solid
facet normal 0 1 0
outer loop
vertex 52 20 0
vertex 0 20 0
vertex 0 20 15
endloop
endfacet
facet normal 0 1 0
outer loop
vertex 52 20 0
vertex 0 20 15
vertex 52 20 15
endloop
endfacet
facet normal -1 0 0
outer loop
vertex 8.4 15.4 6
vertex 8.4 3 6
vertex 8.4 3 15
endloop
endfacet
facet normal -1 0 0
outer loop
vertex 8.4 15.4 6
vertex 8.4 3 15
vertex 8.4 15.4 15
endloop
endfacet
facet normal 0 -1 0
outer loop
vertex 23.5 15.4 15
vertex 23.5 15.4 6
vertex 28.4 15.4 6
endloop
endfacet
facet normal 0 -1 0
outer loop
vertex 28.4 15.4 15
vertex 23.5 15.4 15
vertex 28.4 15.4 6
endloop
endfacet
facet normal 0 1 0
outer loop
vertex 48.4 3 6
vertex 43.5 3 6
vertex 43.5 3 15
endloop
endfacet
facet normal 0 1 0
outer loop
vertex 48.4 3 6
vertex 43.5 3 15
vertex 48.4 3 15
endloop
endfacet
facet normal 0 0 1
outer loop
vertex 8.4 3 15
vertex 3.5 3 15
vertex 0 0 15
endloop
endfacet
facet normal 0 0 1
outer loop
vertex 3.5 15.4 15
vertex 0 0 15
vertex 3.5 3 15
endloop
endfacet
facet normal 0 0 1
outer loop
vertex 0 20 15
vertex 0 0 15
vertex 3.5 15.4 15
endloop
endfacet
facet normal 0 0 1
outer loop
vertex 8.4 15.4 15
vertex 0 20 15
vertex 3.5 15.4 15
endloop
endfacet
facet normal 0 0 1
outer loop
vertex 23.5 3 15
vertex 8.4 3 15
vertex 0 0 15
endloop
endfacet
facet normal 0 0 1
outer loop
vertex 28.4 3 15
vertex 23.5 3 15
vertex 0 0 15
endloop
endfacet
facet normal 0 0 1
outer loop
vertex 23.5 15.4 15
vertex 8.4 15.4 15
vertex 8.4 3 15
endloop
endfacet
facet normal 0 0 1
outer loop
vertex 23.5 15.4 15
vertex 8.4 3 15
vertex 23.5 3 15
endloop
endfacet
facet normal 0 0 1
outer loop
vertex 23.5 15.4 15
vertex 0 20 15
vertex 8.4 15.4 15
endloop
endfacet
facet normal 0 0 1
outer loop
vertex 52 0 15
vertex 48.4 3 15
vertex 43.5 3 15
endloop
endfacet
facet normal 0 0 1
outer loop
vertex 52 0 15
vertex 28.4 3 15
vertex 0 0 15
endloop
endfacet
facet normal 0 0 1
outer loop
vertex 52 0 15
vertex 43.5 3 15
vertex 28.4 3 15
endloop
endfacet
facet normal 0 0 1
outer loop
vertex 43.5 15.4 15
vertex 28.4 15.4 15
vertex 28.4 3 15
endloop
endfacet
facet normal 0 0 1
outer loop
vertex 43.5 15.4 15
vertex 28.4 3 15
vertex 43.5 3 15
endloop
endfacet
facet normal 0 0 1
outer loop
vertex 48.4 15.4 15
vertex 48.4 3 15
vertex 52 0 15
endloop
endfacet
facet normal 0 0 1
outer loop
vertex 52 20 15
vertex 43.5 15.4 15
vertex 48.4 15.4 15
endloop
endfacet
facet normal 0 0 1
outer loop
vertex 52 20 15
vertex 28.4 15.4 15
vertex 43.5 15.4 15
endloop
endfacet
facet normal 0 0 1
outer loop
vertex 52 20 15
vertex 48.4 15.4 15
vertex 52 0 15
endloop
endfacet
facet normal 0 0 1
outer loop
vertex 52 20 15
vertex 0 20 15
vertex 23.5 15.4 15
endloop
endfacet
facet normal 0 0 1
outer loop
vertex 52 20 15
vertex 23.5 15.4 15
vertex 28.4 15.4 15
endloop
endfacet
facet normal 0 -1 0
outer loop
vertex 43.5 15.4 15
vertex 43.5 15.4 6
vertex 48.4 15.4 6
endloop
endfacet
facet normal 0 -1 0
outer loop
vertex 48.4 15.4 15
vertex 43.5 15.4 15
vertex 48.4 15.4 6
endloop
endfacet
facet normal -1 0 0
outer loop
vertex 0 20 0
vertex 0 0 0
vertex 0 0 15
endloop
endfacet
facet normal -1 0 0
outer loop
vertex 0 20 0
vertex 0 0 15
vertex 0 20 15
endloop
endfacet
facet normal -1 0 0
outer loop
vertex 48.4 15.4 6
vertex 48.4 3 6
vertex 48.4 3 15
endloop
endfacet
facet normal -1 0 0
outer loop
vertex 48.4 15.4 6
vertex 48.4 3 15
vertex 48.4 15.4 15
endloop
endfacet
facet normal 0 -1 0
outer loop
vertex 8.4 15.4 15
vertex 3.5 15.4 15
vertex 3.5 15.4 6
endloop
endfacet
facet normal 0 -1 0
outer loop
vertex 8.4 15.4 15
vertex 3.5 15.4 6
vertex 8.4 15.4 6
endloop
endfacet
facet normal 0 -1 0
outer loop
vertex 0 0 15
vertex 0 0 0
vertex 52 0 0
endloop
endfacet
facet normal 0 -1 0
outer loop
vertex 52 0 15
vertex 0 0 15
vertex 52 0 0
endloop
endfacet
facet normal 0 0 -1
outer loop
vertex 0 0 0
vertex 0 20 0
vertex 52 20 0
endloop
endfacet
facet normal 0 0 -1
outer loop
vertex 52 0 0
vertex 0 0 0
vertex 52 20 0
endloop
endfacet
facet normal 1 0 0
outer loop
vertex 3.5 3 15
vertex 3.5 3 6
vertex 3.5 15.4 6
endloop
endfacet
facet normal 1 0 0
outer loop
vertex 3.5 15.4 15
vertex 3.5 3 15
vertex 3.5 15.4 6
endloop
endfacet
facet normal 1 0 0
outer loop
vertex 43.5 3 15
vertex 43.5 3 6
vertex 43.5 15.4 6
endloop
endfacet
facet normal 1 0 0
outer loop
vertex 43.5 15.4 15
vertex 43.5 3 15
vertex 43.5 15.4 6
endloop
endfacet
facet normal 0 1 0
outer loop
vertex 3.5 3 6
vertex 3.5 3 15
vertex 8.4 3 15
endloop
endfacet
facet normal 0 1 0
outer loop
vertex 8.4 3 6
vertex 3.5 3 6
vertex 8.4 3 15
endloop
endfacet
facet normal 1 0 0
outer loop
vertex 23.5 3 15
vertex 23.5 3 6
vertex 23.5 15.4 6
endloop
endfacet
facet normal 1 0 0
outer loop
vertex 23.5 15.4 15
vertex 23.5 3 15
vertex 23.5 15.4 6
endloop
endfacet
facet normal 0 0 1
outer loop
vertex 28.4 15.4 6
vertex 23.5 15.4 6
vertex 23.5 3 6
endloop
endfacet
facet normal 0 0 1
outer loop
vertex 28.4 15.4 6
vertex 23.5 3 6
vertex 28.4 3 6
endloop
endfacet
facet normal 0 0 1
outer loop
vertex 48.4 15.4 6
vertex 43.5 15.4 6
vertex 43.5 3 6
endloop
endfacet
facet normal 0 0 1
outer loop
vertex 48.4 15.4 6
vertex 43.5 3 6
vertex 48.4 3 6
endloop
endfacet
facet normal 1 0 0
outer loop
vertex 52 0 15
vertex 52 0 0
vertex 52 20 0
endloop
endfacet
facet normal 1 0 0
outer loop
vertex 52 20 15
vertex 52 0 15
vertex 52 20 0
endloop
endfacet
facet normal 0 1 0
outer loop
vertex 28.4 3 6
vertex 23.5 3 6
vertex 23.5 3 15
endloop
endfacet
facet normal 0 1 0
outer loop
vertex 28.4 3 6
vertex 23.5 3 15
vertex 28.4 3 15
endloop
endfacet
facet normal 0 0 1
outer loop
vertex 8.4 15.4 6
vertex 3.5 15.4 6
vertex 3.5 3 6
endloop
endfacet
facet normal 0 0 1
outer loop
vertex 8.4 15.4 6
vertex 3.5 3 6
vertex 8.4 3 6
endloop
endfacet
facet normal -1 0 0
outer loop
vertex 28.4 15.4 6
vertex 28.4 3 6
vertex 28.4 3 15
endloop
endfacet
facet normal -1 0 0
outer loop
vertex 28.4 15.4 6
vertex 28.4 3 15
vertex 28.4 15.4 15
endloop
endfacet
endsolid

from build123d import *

# Parameters (mm, degrees)
BOX003_W     = 4.9
BOX003_H     = 12.4
BOX003_DEPTH = 10
BOX002_W     = 4.9
BOX002_H     = 12.4
BOX002_DEPTH = 10
BOX001_W     = 4.9
BOX001_H     = 12.4
BOX001_DEPTH = 10
BOX_W        = 52
BOX_H        = 20
BOX_DEPTH    = 15


with BuildPart() as cube003:
    # Box003 → Box003 (new body)
    with BuildSketch(Plane(origin=(43.5, 3, 6), x_dir=(1, 0, 0), z_dir=(0, 0, 1))):
        with Locations((2.45, 6.2)):
            Rectangle(BOX003_W, BOX003_H)
    extrude(amount=BOX003_DEPTH)


with BuildPart() as cube002:
    # Box002 → Box002 (new body)
    with BuildSketch(Plane(origin=(23.5, 3, 6), x_dir=(1, 0, 0), z_dir=(0, 0, 1))):
        with Locations((2.45, 6.2)):
            Rectangle(BOX002_W, BOX002_H)
    extrude(amount=BOX002_DEPTH)


with BuildPart() as cube001:
    # Box001 → Box001 (new body)
    with BuildSketch(Plane(origin=(3.5, 3, 6), x_dir=(1, 0, 0), z_dir=(0, 0, 1))):
        with Locations((2.45, 6.2)):
            Rectangle(BOX001_W, BOX001_H)
    extrude(amount=BOX001_DEPTH)


with BuildPart() as cut002:
    # Box → Box (new body)
    with BuildSketch(Plane.XY):
        with Locations((26, 10)):
            Rectangle(BOX_W, BOX_H)
    extrude(amount=BOX_DEPTH)

    # Cut: cut Cube001
    add(cube001.part, mode=Mode.SUBTRACT)

    # Cut001: cut Cube002
    add(cube002.part, mode=Mode.SUBTRACT)

    # Cut002: cut Cube003
    add(cube003.part, mode=Mode.SUBTRACT)


solid = cut002.part
